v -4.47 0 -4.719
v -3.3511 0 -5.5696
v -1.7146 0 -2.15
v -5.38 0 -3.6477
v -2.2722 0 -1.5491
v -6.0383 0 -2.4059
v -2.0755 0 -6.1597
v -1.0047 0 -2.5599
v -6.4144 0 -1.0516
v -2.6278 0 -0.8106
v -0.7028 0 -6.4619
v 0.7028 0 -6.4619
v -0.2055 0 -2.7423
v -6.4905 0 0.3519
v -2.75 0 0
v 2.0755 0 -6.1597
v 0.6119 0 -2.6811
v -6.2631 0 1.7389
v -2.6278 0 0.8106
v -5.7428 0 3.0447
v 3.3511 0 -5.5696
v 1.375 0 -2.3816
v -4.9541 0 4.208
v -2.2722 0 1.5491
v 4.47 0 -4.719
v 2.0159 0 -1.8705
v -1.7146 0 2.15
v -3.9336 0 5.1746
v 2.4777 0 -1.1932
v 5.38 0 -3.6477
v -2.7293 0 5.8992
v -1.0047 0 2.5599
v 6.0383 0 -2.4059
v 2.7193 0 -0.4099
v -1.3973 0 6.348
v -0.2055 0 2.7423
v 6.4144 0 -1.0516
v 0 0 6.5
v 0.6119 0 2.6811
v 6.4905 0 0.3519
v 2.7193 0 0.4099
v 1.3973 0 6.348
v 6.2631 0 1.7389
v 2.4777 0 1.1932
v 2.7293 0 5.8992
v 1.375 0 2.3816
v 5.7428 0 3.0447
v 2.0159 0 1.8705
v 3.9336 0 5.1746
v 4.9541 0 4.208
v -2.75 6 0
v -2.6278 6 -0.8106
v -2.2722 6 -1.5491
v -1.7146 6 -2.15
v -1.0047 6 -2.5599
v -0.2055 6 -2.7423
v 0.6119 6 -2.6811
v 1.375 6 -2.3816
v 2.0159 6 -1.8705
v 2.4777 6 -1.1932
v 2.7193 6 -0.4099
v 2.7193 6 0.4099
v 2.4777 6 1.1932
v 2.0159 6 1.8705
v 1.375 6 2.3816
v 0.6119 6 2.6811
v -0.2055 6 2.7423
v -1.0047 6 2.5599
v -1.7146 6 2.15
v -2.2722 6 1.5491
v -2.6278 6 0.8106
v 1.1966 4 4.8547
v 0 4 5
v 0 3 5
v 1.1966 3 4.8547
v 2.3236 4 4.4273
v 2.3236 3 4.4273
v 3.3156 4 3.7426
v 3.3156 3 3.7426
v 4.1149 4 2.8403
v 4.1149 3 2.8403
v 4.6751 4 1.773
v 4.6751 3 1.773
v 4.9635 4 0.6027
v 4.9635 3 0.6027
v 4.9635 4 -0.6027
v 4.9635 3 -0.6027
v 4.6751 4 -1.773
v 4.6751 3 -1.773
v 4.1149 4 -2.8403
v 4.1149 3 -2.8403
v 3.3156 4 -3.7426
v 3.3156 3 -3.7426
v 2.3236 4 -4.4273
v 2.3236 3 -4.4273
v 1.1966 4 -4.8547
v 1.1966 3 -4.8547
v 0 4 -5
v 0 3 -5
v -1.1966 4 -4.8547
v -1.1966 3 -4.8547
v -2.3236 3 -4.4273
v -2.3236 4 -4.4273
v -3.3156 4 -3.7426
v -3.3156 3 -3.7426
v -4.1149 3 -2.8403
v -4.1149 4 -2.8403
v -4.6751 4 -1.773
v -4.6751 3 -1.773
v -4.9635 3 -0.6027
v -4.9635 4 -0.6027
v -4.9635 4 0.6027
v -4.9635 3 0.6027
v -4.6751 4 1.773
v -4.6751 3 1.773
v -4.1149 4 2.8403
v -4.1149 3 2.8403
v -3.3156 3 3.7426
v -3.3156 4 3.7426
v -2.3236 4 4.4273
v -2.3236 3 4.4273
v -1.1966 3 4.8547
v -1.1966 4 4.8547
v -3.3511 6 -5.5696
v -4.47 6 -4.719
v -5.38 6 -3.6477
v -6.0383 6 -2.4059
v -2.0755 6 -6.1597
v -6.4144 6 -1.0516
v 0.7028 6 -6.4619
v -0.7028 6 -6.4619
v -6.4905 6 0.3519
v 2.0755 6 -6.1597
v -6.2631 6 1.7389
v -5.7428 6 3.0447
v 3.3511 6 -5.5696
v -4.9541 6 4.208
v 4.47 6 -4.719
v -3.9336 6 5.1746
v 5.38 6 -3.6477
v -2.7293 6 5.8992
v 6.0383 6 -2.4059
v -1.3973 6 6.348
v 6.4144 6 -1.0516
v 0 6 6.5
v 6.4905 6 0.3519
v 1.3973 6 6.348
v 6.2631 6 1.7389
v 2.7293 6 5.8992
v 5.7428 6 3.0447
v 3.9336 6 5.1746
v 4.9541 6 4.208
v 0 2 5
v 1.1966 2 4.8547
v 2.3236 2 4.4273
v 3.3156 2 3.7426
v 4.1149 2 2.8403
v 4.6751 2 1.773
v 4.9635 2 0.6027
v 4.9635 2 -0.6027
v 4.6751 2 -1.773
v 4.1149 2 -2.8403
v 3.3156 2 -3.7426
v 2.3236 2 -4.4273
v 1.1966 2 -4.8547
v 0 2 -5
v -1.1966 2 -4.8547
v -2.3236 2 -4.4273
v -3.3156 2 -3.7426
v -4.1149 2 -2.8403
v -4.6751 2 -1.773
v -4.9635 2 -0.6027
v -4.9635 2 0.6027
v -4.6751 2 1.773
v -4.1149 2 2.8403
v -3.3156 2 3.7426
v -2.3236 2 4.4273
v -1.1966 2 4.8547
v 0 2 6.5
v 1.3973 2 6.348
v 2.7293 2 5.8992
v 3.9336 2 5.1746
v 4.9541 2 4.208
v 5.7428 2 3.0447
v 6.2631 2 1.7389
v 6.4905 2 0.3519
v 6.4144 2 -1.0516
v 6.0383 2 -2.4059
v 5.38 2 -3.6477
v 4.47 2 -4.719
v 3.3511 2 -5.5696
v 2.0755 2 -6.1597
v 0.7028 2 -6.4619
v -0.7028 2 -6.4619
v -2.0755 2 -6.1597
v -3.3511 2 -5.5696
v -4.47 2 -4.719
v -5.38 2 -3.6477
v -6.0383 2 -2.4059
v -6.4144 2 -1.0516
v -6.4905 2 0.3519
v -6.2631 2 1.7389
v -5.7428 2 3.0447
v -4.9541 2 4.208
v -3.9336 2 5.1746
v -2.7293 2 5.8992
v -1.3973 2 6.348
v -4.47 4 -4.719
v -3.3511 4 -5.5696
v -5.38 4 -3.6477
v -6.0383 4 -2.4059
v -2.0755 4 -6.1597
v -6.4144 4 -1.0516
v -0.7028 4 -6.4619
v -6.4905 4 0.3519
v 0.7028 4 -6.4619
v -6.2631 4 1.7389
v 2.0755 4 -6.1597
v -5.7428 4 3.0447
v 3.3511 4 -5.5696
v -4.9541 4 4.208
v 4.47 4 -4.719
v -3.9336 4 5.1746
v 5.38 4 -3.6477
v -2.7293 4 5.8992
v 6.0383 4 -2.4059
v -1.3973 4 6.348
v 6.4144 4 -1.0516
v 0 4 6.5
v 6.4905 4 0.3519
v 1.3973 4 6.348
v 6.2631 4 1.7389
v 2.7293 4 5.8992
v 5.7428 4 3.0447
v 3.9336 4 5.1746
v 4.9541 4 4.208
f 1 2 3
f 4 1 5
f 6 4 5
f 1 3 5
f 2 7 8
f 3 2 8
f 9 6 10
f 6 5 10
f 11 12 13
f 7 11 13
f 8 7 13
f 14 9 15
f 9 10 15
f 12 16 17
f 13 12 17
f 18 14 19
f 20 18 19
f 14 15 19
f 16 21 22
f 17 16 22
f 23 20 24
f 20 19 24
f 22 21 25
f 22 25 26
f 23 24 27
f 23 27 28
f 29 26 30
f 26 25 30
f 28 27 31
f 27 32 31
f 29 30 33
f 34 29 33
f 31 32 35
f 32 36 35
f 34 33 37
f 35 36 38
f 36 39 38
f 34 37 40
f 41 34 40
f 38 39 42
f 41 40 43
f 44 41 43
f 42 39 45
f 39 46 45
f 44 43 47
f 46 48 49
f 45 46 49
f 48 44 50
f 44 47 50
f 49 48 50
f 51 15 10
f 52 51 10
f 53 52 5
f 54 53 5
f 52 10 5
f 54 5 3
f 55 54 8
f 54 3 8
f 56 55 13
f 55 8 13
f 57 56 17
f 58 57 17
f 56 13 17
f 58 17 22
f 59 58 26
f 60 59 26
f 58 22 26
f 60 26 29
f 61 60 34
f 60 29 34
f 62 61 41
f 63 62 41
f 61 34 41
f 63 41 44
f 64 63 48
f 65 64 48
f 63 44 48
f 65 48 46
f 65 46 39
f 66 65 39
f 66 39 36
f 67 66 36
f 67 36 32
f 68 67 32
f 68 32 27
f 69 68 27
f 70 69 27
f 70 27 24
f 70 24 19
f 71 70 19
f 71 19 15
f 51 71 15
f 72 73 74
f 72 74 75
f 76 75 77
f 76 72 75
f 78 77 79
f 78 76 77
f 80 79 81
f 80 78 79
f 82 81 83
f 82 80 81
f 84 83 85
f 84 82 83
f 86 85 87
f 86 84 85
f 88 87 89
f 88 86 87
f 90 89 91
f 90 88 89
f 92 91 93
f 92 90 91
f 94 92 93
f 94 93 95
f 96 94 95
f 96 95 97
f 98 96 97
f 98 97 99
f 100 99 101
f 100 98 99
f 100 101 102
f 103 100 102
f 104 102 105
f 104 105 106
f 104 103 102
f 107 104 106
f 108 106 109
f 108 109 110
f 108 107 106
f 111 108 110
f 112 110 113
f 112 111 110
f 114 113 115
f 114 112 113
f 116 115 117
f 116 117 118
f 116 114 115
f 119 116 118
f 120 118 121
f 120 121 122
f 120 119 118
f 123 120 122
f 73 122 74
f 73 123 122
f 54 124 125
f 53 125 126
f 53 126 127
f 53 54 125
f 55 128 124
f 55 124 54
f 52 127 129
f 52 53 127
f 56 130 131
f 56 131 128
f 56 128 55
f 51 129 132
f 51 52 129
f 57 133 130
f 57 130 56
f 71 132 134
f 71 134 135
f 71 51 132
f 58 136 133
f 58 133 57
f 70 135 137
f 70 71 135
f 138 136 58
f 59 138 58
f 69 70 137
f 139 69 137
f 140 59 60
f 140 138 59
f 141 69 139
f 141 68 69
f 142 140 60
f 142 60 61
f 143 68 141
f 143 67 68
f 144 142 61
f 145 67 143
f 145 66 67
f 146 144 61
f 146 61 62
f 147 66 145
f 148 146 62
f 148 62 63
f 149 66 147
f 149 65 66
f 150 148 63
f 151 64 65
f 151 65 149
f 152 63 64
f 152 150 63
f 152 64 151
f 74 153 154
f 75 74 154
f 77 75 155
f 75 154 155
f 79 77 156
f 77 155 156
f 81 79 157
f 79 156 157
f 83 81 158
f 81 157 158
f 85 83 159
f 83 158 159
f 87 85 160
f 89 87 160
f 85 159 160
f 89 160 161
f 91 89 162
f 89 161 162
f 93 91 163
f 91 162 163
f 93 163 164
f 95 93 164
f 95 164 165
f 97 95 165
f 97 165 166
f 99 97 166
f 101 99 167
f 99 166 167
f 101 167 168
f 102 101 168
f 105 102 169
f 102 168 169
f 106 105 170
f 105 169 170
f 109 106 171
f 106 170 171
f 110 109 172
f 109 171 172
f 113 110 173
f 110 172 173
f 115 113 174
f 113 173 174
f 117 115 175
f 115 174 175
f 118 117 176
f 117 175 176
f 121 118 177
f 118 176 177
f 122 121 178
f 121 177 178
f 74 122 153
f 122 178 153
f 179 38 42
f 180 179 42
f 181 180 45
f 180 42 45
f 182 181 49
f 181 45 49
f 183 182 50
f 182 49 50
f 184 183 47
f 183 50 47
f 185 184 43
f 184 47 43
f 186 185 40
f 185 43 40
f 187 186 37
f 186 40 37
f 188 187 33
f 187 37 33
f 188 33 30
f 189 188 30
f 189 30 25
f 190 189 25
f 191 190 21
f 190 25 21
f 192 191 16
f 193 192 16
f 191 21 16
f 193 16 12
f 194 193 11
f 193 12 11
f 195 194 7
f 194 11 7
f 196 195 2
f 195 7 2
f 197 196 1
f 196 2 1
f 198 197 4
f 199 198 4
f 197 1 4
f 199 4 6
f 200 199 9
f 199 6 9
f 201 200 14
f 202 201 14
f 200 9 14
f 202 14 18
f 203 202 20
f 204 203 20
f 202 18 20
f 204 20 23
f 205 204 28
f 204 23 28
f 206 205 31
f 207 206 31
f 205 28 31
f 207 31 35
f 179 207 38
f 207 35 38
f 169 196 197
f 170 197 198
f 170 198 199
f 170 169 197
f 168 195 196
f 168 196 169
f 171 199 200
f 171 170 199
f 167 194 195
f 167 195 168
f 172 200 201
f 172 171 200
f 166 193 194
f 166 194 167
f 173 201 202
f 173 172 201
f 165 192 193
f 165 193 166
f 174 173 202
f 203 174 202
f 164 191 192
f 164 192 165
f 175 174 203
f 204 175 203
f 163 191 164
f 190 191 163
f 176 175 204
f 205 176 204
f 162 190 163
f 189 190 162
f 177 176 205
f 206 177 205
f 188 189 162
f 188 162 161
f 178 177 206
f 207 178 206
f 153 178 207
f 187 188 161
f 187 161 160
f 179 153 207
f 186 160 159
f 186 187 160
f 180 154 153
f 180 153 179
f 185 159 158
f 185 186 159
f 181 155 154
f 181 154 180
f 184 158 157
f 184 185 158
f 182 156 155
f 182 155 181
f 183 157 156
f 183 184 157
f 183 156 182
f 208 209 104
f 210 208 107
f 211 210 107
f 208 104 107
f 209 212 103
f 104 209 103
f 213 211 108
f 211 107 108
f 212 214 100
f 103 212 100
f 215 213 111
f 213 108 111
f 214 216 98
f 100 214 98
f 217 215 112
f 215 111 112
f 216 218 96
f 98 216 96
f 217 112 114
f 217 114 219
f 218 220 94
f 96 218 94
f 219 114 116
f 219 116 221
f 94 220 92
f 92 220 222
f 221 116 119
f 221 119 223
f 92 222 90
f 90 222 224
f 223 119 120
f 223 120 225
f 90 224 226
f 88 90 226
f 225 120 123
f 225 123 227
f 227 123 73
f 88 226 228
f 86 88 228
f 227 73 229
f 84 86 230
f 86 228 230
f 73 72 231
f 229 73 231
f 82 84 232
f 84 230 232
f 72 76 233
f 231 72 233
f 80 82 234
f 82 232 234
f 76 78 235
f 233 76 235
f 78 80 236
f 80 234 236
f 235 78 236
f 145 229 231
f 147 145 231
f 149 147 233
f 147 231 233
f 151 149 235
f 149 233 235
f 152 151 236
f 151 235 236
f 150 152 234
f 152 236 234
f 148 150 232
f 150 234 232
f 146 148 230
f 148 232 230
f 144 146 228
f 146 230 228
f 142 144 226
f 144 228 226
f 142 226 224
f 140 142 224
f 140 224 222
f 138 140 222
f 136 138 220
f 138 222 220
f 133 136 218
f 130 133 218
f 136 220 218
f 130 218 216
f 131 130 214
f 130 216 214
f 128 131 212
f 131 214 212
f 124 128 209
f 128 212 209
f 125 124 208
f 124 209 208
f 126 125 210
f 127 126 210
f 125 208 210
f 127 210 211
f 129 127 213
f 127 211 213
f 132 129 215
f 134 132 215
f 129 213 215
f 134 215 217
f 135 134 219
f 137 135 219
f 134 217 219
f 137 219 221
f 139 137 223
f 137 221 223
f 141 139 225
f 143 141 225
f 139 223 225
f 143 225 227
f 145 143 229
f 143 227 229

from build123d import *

# Parameters (mm, degrees)
SKIZZE1_R                       = 6.5
AUFSATZ_LINEAR_AUSTRAGEN1_DEPTH = 2
SKIZZE2_R                       = 5
AUFSATZ_LINEAR_AUSTRAGEN2_DEPTH = 1
SKIZZE3_R                       = 6.5
AUFSATZ_LINEAR_AUSTRAGEN3_DEPTH = 2
DURCHGANGSLOCH_F_R_M51_D        = 5.5


with BuildPart() as part:
    # Skizze1 → Aufsatz-Linear austragen1 (new body)
    with BuildSketch(Plane(origin=(0, 0, 0), x_dir=(1, 0, 0), z_dir=(0, 1, 0))):
        with Locations(Location((0, 0, 0), (0, 0, 270))):
            Circle(SKIZZE1_R)
    extrude(amount=AUFSATZ_LINEAR_AUSTRAGEN1_DEPTH)

    # Skizze2 → Aufsatz-Linear austragen2 (add)
    with BuildSketch(Plane(origin=(0, 2, 0), x_dir=(1, 0, 0), z_dir=(0, 1, 0))):
        with Locations(Location((0, 0, 0), (0, 0, 270))):
            Circle(SKIZZE2_R)
    aufsatz_linear_austragen2 = extrude(amount=AUFSATZ_LINEAR_AUSTRAGEN2_DEPTH)

    # Spiegeln3: Aufsatz-Linear austragen2 across plane
    add(aufsatz_linear_austragen2.mirror(Plane.ZX.offset(3)))

    # Skizze3 → Aufsatz-Linear austragen3 (add)
    with BuildSketch(Plane(origin=(0, 4, 0), x_dir=(1, 0, 0), z_dir=(0, 1, 0))):
        with Locations(Location((0, 0, 0), (0, 0, 270))):
            Circle(SKIZZE3_R)
    extrude(amount=AUFSATZ_LINEAR_AUSTRAGEN3_DEPTH)

    # Durchgangsloch für M51 (through all)
    with Locations(Plane(origin=(0, 6, 0), x_dir=(1, 0, 0), z_dir=(0, 1, 0))):
        with Locations((0, 0)):
            Hole(DURCHGANGSLOCH_F_R_M51_D / 2)


solid = part.part
